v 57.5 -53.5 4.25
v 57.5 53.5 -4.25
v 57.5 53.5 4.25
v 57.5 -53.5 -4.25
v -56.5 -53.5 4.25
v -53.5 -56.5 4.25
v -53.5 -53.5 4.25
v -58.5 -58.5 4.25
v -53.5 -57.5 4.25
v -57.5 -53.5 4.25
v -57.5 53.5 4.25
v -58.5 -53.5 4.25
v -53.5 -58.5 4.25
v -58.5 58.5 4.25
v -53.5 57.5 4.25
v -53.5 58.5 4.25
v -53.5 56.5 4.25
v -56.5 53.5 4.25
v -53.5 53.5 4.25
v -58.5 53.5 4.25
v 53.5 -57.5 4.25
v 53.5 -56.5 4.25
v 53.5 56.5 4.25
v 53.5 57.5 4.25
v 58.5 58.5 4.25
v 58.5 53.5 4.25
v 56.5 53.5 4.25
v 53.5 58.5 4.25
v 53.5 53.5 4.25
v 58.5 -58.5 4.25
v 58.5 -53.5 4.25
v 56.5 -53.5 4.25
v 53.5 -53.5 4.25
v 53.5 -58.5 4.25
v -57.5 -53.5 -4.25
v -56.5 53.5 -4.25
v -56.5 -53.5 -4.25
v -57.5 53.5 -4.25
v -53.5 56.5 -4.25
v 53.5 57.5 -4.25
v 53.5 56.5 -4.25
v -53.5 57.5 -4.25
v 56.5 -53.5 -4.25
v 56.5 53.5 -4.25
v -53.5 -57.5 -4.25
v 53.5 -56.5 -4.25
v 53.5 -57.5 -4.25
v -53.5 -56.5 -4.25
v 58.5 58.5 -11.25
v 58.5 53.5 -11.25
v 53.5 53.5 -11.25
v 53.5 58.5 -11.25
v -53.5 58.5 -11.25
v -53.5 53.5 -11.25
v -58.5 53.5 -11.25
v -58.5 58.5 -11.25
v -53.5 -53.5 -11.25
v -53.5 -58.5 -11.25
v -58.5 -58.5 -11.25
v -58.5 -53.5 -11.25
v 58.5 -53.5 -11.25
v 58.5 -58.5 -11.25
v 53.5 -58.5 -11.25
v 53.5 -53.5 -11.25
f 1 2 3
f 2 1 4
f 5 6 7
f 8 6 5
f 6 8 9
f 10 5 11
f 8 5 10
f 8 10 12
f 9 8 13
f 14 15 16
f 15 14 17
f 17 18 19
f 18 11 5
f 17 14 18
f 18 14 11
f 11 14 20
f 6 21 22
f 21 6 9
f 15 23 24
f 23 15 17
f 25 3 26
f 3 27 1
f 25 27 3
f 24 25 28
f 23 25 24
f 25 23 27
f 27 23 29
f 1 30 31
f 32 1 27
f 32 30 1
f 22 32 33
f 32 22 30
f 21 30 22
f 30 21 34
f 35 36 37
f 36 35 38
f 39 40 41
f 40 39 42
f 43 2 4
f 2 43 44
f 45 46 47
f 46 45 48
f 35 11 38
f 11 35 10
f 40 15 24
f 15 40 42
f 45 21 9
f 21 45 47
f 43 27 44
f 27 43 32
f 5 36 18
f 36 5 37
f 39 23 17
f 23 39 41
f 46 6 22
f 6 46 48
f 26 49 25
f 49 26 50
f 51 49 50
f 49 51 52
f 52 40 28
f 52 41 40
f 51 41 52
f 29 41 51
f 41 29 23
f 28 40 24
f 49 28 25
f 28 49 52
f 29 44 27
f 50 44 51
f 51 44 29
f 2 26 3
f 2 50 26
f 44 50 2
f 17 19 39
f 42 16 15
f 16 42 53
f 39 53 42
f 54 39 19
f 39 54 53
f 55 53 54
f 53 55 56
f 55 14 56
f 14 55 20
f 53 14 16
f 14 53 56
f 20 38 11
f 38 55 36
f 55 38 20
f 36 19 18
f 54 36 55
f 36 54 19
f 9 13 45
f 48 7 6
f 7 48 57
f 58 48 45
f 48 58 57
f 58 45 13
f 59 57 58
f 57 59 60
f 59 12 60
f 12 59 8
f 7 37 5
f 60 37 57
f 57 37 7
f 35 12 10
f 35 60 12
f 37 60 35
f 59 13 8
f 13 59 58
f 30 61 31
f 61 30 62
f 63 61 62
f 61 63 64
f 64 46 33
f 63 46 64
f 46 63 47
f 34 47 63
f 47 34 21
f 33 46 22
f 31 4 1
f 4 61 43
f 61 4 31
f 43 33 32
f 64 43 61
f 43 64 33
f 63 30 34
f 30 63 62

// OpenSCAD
pedestal_width=115;
pedestal_height=8;
pedestal_thickness=2;
leg_width=5;
leg_height=15;
leg_offset=1;



module pedestal(pw=pedestal_width,ph=pedestal_height,pt=pedestal_thickness,lw=leg_width,lh=leg_height,lo=leg_offset) {
    union() {
        difference() {
            cube([pw,pw,0.5+ph],true);
            cube([pw-pt,pw-pt,ph+5],true);
        }
        translate([lo+(pw-lw)/2,lo+(pw-lw)/2,(lh-ph)/-2])
            cube([lw,lw,0.5+lh],true);
        translate([-(lo+(pw-lw)/2),lo+(pw-lw)/2,(lh-ph)/-2])
            cube([lw,lw,0.5+lh],true);
        translate([-(lo+(pw-lw)/2),-(lo+(pw-lw)/2),(lh-ph)/-2])
            cube([lw,lw,0.5+lh],true);
        translate([lo+(pw-lw)/2,-(lo+(pw-lw)/2),(lh-ph)/-2])
            cube([lw,lw,0.5+lh],true);
    }
}

pedestal();
